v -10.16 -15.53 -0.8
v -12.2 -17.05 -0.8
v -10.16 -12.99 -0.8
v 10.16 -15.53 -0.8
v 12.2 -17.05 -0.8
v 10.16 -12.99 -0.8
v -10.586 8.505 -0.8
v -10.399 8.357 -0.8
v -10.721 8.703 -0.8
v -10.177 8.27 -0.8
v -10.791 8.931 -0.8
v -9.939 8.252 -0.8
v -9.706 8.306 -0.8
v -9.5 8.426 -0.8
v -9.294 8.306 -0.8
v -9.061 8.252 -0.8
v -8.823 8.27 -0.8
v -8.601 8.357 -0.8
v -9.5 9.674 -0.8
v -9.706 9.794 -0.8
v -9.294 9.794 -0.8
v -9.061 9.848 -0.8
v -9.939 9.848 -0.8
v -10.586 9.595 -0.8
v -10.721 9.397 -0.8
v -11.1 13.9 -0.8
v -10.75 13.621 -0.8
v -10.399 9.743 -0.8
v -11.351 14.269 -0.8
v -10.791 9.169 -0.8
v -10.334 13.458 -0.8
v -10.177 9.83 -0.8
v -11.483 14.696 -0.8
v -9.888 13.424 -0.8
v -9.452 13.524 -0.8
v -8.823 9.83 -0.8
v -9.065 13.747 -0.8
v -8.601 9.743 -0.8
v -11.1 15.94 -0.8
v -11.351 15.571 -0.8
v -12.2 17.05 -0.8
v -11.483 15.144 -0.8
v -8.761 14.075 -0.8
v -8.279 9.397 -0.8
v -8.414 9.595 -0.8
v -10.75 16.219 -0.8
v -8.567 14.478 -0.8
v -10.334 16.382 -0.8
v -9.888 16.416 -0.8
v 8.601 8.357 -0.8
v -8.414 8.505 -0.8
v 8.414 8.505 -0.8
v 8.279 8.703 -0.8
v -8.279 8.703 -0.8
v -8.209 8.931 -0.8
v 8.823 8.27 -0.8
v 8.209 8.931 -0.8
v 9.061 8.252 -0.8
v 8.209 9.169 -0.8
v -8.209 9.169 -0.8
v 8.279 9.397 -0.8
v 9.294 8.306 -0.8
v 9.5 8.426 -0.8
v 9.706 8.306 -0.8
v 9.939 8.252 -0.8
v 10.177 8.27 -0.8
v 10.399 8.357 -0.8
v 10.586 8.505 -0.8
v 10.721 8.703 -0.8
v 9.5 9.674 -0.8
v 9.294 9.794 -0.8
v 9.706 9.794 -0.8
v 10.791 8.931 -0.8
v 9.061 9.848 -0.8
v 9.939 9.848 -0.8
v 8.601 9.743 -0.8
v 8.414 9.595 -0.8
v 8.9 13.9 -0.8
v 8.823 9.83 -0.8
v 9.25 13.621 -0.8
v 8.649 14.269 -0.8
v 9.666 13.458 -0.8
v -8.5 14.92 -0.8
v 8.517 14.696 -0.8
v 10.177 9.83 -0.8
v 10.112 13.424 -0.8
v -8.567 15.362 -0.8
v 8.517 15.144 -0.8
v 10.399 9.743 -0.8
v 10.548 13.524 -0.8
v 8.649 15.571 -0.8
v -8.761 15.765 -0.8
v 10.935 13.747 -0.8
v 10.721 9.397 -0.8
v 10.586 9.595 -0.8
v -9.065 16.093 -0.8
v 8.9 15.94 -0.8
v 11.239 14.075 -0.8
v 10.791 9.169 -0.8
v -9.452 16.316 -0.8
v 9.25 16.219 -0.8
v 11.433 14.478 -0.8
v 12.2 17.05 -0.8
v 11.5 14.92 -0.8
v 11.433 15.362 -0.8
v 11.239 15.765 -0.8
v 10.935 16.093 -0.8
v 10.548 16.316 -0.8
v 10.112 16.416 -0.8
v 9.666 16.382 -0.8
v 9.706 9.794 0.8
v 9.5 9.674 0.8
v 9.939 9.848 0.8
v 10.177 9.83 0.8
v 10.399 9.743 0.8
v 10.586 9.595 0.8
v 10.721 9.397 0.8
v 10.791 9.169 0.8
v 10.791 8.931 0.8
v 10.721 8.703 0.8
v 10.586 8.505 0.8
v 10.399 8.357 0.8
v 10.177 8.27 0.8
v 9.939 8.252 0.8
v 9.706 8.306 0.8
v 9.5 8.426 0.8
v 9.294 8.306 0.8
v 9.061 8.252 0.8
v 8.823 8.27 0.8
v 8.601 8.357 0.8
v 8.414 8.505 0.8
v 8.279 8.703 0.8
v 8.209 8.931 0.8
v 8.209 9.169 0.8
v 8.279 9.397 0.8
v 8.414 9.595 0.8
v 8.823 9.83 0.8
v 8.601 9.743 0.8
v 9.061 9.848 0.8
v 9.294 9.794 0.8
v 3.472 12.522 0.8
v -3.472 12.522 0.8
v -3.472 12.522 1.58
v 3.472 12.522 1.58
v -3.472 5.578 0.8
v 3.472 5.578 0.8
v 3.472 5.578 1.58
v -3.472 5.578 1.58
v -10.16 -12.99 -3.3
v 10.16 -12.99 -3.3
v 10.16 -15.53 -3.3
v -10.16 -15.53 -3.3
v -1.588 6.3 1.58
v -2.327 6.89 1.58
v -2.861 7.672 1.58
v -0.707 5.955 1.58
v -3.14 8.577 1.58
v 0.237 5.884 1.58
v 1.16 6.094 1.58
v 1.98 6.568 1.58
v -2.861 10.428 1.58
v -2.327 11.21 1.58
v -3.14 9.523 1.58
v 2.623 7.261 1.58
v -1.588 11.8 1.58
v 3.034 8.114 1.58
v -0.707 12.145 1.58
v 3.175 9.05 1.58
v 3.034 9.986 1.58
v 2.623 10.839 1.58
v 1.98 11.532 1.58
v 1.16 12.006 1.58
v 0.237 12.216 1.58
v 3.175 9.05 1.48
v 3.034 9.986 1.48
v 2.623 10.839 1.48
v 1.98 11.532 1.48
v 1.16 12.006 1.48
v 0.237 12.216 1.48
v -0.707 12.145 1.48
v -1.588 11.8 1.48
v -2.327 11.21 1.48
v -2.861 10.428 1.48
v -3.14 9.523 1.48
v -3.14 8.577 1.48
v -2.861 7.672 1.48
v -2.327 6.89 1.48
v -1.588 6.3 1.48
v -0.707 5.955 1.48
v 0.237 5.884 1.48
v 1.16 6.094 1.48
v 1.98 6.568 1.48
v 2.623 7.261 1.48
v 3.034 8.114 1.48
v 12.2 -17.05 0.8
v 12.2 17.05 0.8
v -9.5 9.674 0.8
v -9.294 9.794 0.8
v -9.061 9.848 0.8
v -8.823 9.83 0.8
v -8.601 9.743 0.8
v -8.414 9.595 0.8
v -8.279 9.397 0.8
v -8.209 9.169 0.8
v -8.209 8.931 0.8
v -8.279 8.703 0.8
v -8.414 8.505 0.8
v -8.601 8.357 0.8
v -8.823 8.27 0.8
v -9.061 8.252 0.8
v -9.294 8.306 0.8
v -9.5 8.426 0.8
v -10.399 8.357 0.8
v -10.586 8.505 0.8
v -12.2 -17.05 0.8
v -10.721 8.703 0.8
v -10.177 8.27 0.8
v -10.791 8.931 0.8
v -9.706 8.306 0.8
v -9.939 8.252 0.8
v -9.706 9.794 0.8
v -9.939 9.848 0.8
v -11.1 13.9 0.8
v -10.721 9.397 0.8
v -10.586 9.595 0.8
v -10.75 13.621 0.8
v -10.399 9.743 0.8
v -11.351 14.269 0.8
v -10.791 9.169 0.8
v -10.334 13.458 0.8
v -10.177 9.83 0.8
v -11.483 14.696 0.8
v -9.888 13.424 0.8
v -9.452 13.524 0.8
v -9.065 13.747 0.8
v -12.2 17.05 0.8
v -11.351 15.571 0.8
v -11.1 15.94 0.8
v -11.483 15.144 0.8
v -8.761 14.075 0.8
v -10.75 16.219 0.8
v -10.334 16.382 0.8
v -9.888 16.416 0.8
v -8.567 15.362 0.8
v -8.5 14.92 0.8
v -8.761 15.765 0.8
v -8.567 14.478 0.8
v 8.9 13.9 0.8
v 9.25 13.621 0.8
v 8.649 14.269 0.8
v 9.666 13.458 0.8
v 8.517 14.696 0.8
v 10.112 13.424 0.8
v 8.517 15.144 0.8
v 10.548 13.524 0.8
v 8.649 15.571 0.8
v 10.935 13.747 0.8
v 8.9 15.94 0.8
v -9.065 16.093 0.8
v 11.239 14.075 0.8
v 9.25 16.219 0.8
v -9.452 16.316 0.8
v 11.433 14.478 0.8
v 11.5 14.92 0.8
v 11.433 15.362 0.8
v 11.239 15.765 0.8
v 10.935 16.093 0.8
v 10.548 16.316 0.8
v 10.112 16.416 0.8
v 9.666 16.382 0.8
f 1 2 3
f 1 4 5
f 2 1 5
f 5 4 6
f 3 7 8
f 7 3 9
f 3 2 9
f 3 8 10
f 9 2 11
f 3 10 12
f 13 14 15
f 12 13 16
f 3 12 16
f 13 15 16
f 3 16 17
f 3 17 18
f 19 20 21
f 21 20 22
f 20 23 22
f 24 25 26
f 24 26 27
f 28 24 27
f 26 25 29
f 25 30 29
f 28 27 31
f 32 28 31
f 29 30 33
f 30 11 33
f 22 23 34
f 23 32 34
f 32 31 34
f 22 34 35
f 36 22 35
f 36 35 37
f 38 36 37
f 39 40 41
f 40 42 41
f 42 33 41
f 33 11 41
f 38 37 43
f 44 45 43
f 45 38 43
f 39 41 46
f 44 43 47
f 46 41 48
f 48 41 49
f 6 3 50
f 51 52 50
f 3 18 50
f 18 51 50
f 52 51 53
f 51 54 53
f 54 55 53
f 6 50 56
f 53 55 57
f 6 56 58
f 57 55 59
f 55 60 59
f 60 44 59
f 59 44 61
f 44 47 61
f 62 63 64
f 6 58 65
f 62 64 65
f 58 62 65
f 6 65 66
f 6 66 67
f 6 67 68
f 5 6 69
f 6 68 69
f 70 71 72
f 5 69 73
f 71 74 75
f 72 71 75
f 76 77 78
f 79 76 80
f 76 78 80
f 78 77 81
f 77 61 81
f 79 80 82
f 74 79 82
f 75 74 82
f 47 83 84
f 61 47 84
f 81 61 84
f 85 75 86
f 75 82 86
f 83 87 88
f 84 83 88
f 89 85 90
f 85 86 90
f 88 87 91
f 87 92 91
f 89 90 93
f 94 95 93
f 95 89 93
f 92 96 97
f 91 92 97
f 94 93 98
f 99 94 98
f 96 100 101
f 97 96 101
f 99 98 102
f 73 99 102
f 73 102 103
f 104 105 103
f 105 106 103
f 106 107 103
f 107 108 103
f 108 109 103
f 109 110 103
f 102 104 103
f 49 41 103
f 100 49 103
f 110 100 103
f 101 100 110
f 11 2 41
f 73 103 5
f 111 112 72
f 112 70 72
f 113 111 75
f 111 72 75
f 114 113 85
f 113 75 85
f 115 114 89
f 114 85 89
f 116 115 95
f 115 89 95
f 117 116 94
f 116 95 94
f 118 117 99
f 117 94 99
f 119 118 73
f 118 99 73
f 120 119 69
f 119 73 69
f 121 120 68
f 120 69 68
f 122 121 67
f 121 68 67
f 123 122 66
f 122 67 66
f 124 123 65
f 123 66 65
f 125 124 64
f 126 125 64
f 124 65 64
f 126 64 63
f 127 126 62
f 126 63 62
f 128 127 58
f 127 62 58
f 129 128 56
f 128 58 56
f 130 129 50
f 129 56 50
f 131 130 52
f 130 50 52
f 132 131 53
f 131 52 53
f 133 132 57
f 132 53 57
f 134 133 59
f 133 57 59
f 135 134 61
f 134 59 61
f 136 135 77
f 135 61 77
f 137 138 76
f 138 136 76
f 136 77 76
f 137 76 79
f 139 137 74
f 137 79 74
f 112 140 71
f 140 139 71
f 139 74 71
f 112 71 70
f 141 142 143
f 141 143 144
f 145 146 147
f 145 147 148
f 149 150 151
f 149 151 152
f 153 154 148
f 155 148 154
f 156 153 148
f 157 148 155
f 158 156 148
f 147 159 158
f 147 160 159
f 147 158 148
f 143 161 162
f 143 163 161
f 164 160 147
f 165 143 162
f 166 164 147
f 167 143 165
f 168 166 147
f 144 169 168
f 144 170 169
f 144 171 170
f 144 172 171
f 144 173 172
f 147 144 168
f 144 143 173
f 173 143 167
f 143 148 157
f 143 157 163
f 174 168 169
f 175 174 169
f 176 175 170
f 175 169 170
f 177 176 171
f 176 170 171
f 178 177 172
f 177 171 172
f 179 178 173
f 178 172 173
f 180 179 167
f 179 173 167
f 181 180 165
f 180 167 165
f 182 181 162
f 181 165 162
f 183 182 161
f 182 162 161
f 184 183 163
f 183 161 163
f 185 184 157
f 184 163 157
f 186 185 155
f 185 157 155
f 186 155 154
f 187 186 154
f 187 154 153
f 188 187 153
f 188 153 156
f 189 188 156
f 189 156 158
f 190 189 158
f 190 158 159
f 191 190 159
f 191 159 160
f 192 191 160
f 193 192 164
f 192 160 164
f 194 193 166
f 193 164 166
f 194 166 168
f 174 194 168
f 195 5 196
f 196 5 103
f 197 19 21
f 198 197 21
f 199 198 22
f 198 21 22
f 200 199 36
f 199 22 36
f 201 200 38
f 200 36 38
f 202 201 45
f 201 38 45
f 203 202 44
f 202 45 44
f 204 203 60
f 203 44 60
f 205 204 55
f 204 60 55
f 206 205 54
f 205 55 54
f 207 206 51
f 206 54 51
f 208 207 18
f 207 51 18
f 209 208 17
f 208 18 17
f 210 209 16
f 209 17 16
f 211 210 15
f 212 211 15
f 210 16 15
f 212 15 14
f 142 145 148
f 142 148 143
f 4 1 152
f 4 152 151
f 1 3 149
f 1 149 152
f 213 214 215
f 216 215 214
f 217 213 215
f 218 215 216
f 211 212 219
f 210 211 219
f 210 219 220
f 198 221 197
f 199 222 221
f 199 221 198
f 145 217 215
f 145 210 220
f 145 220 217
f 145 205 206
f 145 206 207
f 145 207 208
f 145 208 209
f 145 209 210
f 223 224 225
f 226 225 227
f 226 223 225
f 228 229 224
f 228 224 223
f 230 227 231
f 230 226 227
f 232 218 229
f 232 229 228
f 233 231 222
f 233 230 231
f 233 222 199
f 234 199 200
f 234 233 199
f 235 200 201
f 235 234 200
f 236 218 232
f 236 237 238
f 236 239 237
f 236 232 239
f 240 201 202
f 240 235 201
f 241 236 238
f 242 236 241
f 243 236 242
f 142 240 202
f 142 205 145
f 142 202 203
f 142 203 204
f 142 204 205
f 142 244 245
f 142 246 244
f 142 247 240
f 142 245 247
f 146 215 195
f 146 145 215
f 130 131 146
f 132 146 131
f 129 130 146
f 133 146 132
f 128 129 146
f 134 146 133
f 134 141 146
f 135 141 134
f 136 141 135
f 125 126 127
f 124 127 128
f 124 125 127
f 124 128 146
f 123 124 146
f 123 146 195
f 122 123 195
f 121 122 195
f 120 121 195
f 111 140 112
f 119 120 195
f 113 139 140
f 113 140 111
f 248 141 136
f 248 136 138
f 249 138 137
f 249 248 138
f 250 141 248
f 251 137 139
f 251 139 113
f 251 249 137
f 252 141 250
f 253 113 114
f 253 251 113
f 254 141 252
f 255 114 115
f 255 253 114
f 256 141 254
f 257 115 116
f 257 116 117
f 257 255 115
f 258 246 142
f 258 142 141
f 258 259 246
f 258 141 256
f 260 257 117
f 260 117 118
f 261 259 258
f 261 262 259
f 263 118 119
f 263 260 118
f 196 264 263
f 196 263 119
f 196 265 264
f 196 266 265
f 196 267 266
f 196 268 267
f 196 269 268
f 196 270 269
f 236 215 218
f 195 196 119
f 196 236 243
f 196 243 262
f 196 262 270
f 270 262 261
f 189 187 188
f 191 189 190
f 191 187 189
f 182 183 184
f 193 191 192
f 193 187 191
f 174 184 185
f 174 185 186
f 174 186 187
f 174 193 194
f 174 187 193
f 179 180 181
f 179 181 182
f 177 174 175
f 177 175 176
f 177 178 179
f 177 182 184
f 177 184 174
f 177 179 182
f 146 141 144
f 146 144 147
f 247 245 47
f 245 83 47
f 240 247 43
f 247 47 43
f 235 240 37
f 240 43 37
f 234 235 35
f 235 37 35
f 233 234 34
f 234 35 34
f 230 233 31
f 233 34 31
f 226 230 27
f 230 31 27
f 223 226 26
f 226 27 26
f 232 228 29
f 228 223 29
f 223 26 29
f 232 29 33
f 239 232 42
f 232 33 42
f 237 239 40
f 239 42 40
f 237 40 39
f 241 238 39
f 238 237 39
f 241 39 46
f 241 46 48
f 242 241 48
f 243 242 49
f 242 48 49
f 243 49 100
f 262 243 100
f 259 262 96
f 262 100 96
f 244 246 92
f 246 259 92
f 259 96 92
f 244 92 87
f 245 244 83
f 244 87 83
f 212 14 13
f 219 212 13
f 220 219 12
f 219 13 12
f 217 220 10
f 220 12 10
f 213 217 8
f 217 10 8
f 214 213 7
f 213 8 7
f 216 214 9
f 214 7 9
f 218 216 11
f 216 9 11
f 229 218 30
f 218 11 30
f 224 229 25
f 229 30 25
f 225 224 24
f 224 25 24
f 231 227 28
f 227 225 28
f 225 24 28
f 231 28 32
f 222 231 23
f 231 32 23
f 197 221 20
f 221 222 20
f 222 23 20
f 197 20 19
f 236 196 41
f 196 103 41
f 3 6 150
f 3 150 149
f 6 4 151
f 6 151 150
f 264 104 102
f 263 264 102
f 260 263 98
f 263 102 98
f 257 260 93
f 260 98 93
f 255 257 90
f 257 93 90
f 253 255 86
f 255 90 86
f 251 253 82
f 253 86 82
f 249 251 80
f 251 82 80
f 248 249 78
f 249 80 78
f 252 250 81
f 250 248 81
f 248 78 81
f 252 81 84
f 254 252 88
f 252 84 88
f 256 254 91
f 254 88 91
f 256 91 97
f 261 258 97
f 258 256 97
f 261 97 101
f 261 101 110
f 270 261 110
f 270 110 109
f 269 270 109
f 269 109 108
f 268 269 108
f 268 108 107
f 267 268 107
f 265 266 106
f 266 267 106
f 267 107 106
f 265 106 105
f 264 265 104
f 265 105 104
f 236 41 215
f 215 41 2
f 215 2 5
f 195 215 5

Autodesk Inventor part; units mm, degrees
ref_plane "YZ Plane" through (0, 0, 0) normal (1, 0, 0) x (0, 1, 0)
ref_plane "XZ Plane" through (0, 0, 0) normal (0, 1, 0) x (-1, 0, 0)
ref_plane "XY Plane" through (0, 0, 0) normal (0, 0, 1) x (1, 0, 0)
sketch "Sketch1" plane through (0, 0, 0) normal (0, 0, 1) x (1, 0, 0)
  line L0 (-12.2, -17.05) -> (12.2, -17.05)
  line L1 (12.2, -17.05) -> (12.2, 17.05)
  line L2 (12.2, 17.05) -> (-12.2, 17.05)
  line L3 (-12.2, 17.05) -> (-12.2, -17.05)
  line L4 (-12.2, -17.05) -> (12.2, 17.05) construction
  line L5 (12.2, -17.05) -> (-12.2, 17.05) construction
  circle A0 centre (-10, 14.92) radius 1.5
  circle A1 centre (10, 14.92) radius 1.5
  line L6 (-10, 14.92) -> (10, 14.92) construction
  circle A2 centre (-9, 9.05) radius 0.8
  circle A3 centre (-10, 9.05) radius 0.8
  circle A4 centre (9, 9.05) radius 0.8
  circle A5 centre (10, 9.05) radius 0.8
  line L7 (-9, 9.05) -> (9, 9.05) construction
  line L8 (-10, 9.05) -> (10, 9.05) construction
  point P0 (0, 0)
  point P1 (0, 9.05)
  point P2 (0, 14.92)
  point P3 (0, 0)
  point P4 (0, 0)
  dimension "d0" = 24.4
  dimension "d1" = 34.1
  dimension "d2" = 2.13
  dimension "d3" = 3
  dimension "d4" = 10
  dimension "d13" = 20
  dimension "d14" = 18
  dimension "d15" = 1.6
  dimension "d16" = 8
extrude "Extrusion1" add sketch "Sketch1" along normal mid plane 1.6
sketch "Sketch2" plane through (0, 0, -0.8) normal (0, 0, -1) x (-1, 0, 0)
  circle A0 centre (-10, 14.92) radius 1.5 projected
  circle A1 centre (10, 14.92) radius 1.5 projected
  line L0 (-12.2, -17.05) -> (12.2, -17.05) projected
  line L1 (12.2, -17.05) -> (12.2, 17.05) projected
  line L2 (12.2, 17.05) -> (-12.2, 17.05) projected
  line L3 (-12.2, 17.05) -> (-12.2, -17.05) projected
  line L4 (-10.16, -12.99) -> (10.16, -12.99)
  line L5 (10.16, -12.99) -> (10.16, -15.53)
  line L6 (10.16, -15.53) -> (-10.16, -15.53)
  line L7 (-10.16, -15.53) -> (-10.16, -12.99)
  point P0 (0, 0)
  point P1 (0, -12.99)
  point P2 (-10.16, -14.26)
  dimension "d8" = 2.54
  dimension "d9" = 20.32
  dimension "d10" = 2.79
extrude "Extrusion2" add sketch "Sketch2" along normal blind 2.5 contours L4 L5 L6 L7
sketch "Sketch3" plane through (0, 0, 0.8) normal (0, 0, 1) x (1, 0, 0)
  circle A0 centre (10, 14.92) radius 1.5 projected
  circle A1 centre (-10, 14.92) radius 1.5 projected
  arc A2 (-9.5, 8.4255) -> (-9.5, 9.6745) centre (-9, 9.05) ccw projected
  arc A3 (-9.5, 9.6745) -> (-9.5, 8.4255) centre (-10, 9.05) ccw projected
  line L0 (-12.2, -17.05) -> (12.2, -17.05) projected
  line L1 (12.2, -17.05) -> (12.2, 17.05) projected
  line L2 (12.2, 17.05) -> (-12.2, 17.05) projected
  line L3 (-12.2, 17.05) -> (-12.2, -17.05) projected
  arc A4 (9.5, 9.6745) -> (9.5, 8.4255) centre (9, 9.05) ccw projected
  arc A5 (9.5, 8.4255) -> (9.5, 9.6745) centre (10, 9.05) ccw projected
  line L4 (-3.4725, 12.5225) -> (3.4725, 12.5225)
  line L5 (3.4725, 12.5225) -> (3.4725, 5.5775)
  line L6 (3.4725, 5.5775) -> (-3.4725, 5.5775)
  line L7 (-3.4725, 5.5775) -> (-3.4725, 12.5225)
  point P0 (0, 0)
  point P1 (3.4725, 9.05)
  point P2 (0, 12.5225)
  dimension "d17" = 6.945
extrude "Extrusion3" add sketch "Sketch3" along normal blind 0.78 contours L4 L5 L6 L7
sketch "Sketch4" plane through (0, 0, 1.58) normal (0, 0, 1) x (1, 0, 0)
  line L0 (3.4725, 12.5225) -> (-3.4725, 12.5225) projected
  line L1 (-3.4725, 12.5225) -> (-3.4725, 5.5775) projected
  line L2 (-3.4725, 5.5775) -> (3.4725, 5.5775) projected
  line L3 (3.4725, 5.5775) -> (3.4725, 12.5225) projected
  circle A0 centre (0, 9.05) radius 3.175
  point P0 (0, 0)
  point P1 (0, 12.5225)
  point P2 (-3.4725, 9.05)
  dimension "d20" = 6.35
extrude "Extrusion4" cut sketch "Sketch4" against normal blind 0.1 contours A0
equation "\"d9\" = 8 * d8"
properties part number "Module_ArducamMini" material "Epoxy Resin"
